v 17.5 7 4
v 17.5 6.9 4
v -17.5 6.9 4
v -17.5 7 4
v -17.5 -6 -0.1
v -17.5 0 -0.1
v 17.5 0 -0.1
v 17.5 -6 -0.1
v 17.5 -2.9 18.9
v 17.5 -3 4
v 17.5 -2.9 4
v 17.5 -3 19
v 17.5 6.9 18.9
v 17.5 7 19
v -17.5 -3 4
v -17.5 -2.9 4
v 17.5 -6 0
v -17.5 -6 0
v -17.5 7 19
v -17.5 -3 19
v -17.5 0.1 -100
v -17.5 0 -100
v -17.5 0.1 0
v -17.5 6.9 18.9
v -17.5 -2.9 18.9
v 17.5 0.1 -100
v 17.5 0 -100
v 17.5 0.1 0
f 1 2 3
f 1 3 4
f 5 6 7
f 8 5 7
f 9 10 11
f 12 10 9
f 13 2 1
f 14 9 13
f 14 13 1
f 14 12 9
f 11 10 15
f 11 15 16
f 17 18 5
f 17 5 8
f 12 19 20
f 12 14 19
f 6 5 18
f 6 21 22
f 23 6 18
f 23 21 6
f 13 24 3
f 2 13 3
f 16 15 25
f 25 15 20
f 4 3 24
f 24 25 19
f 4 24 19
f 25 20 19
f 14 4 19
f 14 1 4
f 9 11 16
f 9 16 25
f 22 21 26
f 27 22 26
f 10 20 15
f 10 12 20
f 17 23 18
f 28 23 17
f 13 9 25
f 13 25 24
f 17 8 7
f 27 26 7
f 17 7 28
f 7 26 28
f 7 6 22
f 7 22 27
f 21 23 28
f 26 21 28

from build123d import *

# Parameters (mm, degrees)
F2_W          = 35
F2_H          = 0.1
F3_DEPTH      = 100
F4_W          = 35
F4_H          = 0.1
F5_DEPTH      = 6
F7_DEPTH      = 17.5
F7_DEPTH_BACK = 17.5


with BuildPart() as f3:
    # F2 (on Top) → F3 (new body)
    with BuildSketch(Plane.XY):
        with Locations((0, 0.05)):
            Rectangle(F2_W, F2_H)
    extrude(amount=-F3_DEPTH)

    # F4 (on Front) → F5 (join)
    with BuildSketch(Plane.XZ):
        with Locations((0, -0.05)):
            Rectangle(F4_W, F4_H)
    extrude(amount=F5_DEPTH)


with BuildPart() as f7:
    # F6 (on Right) → F7 (new body, two sides)
    with BuildSketch(Plane.YZ) as f7_sk:
        Polygon((-3, 19), (-3, 4), (-2.9, 4), (-2.9, 18.9), (6.9, 18.9), (6.9, 4), (7, 4), (7, 19), align=None)
    extrude(amount=F7_DEPTH)
    extrude(f7_sk.sketch, amount=-F7_DEPTH_BACK)


solid = Compound([f3.part, f7.part])
